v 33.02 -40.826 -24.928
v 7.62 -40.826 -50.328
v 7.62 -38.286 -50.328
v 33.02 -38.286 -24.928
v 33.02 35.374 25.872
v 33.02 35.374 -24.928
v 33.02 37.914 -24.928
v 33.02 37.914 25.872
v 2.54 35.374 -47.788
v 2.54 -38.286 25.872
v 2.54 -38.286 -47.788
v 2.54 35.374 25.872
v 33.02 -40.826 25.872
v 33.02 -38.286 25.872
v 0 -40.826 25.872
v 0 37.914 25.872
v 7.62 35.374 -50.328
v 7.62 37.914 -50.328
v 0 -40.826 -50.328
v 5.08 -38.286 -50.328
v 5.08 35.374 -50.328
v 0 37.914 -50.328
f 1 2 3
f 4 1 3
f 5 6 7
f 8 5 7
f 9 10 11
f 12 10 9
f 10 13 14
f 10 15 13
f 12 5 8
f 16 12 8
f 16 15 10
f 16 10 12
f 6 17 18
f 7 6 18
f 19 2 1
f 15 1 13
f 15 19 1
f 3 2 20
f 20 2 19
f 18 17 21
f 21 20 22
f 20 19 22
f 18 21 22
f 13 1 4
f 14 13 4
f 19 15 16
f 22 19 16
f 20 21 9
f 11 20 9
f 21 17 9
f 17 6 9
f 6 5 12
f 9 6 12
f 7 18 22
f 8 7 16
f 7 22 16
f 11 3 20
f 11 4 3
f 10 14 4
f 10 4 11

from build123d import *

# Parameters (mm, degrees)
F0_W        = 78.74
F0_H        = 76.2
F1_DEPTH    = 33.02
F2_T        = -2.54
F3_T4_DEPTH = 73.66
F4_SIZE     = 25.4


# Not quite as in the source:
# - a fillet or chamfer that OpenCascade refuses, or shapes differently, is made with other operations: its cross-section is extruded or revolved along the edge and cut away or added


with BuildPart() as f1:
    # F0 (on Right) → F1 (new body)
    with BuildSketch(Plane.YZ):
        with Locations((-1.4558544075, -12.2276971856)):
            Rectangle(F0_W, F0_H)
    extrude(amount=F1_DEPTH)

    # F2
    f2_openings = [f1.faces().sort_by_distance(p)[0] for p in [
        (33.02, -1.455854, -12.227697),
        (16.51, -1.455854, 25.872303),
    ]]
    offset(amount=F2_T, openings=f2_openings)

    # F3: chamfer of 30.48 on 1 edges, made by hand


with BuildPart() as f3_tool2:
    # F3_s3 → F3_t4 (new body)
    with BuildSketch(Plane.XZ.offset(38.2858544075)):
        with BuildLine():
            Line((33.8821045876, -79.1298017732), (1.6778954124, -46.925592598))
            Line((1.6778954124, -46.925592598), (1.6778954124, -46.315992598))
            ThreePointArc((1.6778954124, -46.315992598), (17.3489477062, -47.1780971856), (33.02, -47.1780971856))
            Line((33.02, -47.1780971856), (33.6296, -47.7876971856))
            ThreePointArc((33.6296, -47.7876971856), (33.6296, -63.4587494794), (34.4917045876, -79.1298017732))
            Line((34.4917045876, -79.1298017732), (33.8821045876, -79.1298017732))
        make_face()
    extrude(amount=-F3_T4_DEPTH)

    split(bisect_by=Plane.YZ.offset(2.54), keep=Keep.TOP)


with BuildPart() as f1_1:
    add(f1.part)

    # F3_t1: cut F3_tool2
    add(f3_tool2.part, mode=Mode.SUBTRACT)

    # F4
    f4_edges = [f1_1.edges().sort_by_distance(p)[0] for p in [
        (33.02, -39.555854, -50.327697),
        (33.02, 36.644146, -50.327697),
    ]]
    chamfer(f4_edges, length=F4_SIZE)


solid = f1_1.part
